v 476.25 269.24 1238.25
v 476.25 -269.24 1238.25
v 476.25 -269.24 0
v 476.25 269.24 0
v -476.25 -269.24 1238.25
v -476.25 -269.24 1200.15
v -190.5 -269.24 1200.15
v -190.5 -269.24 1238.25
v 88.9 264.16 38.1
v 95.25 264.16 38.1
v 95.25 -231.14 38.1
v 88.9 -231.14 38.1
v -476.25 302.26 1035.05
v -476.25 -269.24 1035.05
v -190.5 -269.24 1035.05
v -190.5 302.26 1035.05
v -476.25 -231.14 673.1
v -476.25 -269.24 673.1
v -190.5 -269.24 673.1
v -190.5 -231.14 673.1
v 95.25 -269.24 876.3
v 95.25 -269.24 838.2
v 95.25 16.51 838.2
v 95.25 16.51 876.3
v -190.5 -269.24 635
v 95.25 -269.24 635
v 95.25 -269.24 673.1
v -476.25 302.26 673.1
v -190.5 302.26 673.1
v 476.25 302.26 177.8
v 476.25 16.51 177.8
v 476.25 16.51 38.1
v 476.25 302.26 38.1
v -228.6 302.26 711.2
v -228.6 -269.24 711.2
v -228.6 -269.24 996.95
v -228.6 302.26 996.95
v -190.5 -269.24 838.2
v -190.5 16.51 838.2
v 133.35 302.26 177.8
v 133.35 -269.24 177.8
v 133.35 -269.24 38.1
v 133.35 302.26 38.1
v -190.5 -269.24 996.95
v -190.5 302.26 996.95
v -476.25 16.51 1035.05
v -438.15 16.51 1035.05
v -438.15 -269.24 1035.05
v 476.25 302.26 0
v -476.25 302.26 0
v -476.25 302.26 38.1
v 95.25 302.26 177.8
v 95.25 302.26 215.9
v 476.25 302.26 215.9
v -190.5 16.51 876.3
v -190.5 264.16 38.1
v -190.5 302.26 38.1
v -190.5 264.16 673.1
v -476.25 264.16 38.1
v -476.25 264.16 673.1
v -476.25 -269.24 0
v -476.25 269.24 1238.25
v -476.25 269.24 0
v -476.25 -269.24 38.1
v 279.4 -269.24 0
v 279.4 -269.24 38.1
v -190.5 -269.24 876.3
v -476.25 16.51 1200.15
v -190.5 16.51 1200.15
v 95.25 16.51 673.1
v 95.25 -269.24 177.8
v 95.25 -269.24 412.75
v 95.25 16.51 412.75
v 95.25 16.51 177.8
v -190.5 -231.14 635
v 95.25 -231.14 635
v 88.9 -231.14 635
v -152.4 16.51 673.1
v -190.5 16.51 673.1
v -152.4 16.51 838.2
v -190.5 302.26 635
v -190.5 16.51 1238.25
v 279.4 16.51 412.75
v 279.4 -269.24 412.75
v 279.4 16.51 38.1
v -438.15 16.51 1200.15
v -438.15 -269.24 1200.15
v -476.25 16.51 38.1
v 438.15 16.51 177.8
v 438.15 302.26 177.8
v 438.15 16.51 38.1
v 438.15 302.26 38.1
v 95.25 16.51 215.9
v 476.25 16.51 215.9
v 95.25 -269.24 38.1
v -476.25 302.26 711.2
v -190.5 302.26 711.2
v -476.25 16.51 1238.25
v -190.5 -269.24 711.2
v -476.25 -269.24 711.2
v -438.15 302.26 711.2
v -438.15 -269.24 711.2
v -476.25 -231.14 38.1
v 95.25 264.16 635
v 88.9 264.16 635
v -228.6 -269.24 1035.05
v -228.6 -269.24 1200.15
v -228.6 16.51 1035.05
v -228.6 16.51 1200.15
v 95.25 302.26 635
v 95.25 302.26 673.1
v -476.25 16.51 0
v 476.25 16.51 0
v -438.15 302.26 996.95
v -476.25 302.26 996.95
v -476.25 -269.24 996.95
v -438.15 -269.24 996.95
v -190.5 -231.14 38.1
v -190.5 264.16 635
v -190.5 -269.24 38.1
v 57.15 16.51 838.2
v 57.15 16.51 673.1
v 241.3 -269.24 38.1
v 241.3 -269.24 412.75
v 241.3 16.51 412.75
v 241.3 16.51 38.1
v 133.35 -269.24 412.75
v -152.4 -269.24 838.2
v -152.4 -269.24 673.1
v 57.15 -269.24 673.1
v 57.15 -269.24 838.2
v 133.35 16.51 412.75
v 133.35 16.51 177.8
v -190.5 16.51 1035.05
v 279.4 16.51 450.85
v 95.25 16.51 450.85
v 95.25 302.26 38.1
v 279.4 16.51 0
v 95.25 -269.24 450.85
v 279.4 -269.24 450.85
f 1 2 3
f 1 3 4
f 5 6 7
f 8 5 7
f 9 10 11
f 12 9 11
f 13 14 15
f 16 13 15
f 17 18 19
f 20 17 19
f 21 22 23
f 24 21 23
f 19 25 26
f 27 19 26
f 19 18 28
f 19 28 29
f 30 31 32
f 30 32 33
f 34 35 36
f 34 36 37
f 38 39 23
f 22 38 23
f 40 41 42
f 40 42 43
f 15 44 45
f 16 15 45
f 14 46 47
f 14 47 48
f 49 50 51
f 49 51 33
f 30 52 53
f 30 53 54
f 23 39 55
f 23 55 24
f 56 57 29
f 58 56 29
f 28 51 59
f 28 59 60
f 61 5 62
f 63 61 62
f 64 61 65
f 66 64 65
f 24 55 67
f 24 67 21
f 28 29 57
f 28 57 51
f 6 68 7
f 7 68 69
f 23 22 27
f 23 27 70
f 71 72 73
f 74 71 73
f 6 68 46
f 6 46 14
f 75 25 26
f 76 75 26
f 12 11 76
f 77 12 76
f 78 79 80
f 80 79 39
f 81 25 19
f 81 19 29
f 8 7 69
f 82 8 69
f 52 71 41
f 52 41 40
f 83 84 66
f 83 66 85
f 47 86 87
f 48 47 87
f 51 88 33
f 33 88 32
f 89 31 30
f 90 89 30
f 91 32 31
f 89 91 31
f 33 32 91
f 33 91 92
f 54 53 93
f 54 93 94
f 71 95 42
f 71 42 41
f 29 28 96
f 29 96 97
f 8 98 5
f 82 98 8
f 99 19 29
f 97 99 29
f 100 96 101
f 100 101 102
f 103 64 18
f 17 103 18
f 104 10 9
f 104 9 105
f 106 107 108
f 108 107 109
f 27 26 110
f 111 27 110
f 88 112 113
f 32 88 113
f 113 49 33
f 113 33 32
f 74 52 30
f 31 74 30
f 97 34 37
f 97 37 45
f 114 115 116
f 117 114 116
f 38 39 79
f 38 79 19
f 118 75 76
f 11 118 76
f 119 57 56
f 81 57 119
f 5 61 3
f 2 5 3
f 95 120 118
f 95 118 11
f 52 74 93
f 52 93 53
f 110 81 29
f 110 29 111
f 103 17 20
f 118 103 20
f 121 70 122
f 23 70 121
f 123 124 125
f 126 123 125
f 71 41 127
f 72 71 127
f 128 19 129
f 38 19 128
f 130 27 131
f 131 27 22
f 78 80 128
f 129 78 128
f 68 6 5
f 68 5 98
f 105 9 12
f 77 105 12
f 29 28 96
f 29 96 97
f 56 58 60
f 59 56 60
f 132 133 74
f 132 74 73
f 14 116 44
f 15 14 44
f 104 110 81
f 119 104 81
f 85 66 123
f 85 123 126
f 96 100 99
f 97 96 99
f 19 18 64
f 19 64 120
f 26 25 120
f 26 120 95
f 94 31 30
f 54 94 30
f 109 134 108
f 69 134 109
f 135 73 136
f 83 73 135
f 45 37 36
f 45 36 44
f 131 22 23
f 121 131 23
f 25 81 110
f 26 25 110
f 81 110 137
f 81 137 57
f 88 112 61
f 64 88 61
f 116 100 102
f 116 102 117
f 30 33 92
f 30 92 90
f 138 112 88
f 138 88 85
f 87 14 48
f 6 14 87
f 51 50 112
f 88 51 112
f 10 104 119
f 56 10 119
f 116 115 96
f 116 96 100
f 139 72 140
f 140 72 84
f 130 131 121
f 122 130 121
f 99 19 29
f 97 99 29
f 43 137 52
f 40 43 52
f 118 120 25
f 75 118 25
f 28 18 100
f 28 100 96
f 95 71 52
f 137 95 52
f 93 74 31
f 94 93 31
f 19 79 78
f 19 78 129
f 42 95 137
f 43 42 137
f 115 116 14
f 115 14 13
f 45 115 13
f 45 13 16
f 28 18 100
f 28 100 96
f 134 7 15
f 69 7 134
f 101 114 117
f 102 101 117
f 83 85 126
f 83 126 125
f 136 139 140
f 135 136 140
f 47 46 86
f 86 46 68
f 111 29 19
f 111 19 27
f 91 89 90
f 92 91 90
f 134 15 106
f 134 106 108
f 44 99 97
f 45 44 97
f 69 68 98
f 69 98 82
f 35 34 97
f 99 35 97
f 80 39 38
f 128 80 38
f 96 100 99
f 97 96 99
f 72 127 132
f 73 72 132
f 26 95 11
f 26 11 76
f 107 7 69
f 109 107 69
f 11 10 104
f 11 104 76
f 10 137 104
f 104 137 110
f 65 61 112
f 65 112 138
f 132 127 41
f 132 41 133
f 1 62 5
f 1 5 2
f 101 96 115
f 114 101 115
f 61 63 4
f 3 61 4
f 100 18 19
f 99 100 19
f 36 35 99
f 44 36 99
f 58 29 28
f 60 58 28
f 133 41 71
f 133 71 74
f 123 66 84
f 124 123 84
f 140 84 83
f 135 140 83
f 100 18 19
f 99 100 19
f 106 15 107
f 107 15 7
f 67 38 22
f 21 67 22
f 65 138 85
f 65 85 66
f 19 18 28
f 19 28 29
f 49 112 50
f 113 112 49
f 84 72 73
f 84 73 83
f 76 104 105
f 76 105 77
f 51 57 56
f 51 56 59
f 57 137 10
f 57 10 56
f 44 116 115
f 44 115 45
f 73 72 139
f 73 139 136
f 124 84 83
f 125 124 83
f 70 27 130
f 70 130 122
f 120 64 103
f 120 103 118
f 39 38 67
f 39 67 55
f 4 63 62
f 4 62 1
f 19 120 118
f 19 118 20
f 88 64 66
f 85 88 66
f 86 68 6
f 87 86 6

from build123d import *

# Parameters (mm, degrees)
F0_W      = 952.5
F0_H      = 538.48
F1_DEPTH  = 1238.25
F2_W      = 755.65
F2_H      = 285.75
F3_DEPTH  = 38.1
F4_W      = 952.5
F4_H      = 285.75
F5_DEPTH  = 38.1
F6_W      = 285.75
F6_H      = 635
F7_DEPTH  = 38.1
F8_W      = 285.75
F8_H      = 596.9
F9_DEPTH  = 38.1
F10_W     = 285.75
F10_H     = 635
F11_DEPTH = 38.1
F12_W     = 285.75
F12_H     = 596.9
F13_DEPTH = 38.1
F14_W     = 571.5
F14_H     = 139.7
F15_DEPTH = 38.1
F16_W     = 285.75
F16_H     = 374.65
F17_DEPTH = 38.1
F18_W     = 285.75
F18_H     = 139.7
F19_DEPTH = 38.1
F20_W     = 381
F20_H     = 285.75
F21_DEPTH = 38.1
F22_W     = 285.75
F22_H     = 234.95
F23_DEPTH = 38.1
F24_W     = 184.15
F24_H     = 285.75
F25_DEPTH = 38.1
F26_W     = 285.75
F26_H     = 571.5
F27_DEPTH = 38.1
F28_W     = 285.75
F28_H     = 571.5
F29_DEPTH = 38.1
F30_W     = 285.75
F30_H     = 165.1
F31_DEPTH = 38.1
F32_W     = 285.75
F32_H     = 165.1
F33_DEPTH = 38.1
F34_W     = 285.75
F34_H     = 285.75
F35_DEPTH = 38.1
F36_W     = 285.75
F36_H     = 571.5
F37_DEPTH = 38.1
F38_W     = 38.1
F38_H     = 571.5
F39_DEPTH = 285.75
F40_W     = 571.5
F40_H     = 285.75
F41_DEPTH = 38.1
F42_W     = 285.75
F42_H     = 571.5
F43_DEPTH = 38.1
F44_W     = 285.75
F44_H     = 165.1
F45_DEPTH = 38.1
F46_W     = 285.75
F46_H     = 165.1
F47_DEPTH = 38.1
F48_W     = 285.75
F48_H     = 285.75
F49_DEPTH = 38.1
F50_W     = 495.3
F50_H     = 596.9
F51_DEPTH = 6.35


with BuildPart() as f1:
    # F0 (on Top) → F1 (new body)
    with BuildSketch(Plane.XY):
        Rectangle(F0_W, F0_H)
    extrude(amount=F1_DEPTH)


with BuildPart() as f3:
    # F2 (on face) → F3 (new body)
    with BuildSketch(Plane(origin=(0, 0, 0), x_dir=(1, 0, 0), z_dir=(0, 0, -1))):
        with Locations((-98.425, 126.365)):
            Rectangle(F2_W, F2_H)
    extrude(amount=-F3_DEPTH)


with BuildPart() as f5:
    # F4 (on face) → F5 (new body)
    with BuildSketch(Plane(origin=(0, 0, 0), x_dir=(1, 0, 0), z_dir=(0, 0, -1))):
        with Locations((0, -159.385)):
            Rectangle(F4_W, F4_H)
    extrude(amount=-F5_DEPTH)


with BuildPart() as f7:
    # F6 (on face) → F7 (new body)
    with BuildSketch(Plane(origin=(0, 302.26, 0), x_dir=(-1, 0, 0), z_dir=(0, 1, 0))):
        with Locations((333.375, 355.6)):
            Rectangle(F6_W, F6_H)
    extrude(amount=-F7_DEPTH)


with BuildPart() as f9:
    # F8 (on face) → F9 (new body)
    with BuildSketch(Plane(origin=(0, 302.26, 0), x_dir=(-1, 0, 0), z_dir=(0, 1, 0))):
        with Locations((47.625, 336.55)):
            Rectangle(F8_W, F8_H)
    extrude(amount=-F9_DEPTH)


with BuildPart() as f11:
    # F10 (on face) → F11 (new body)
    with BuildSketch(Plane.XZ.offset(269.24)):
        with Locations((-333.375, 355.6)):
            Rectangle(F10_W, F10_H)
    extrude(amount=-F11_DEPTH)


with BuildPart() as f13:
    # F12 (on face) → F13 (new body)
    with BuildSketch(Plane.XZ.offset(269.24)):
        with Locations((-47.625, 336.55)):
            Rectangle(F12_W, F12_H)
    extrude(amount=-F13_DEPTH)


with BuildPart() as f15:
    # F14 (on face) → F15 (new body)
    with BuildSketch(Plane.YZ.offset(95.25)):
        with Locations((16.51, 107.95)):
            Rectangle(F14_W, F14_H)
    extrude(amount=F15_DEPTH)


with BuildPart() as f17:
    # F16 (on face) → F17 (new body)
    with BuildSketch(Plane.YZ.offset(279.4)):
        with Locations((-126.365, 225.425)):
            Rectangle(F16_W, F16_H)
    extrude(amount=-F17_DEPTH)


with BuildPart() as f19:
    # F18 (on face) → F19 (new body)
    with BuildSketch(Plane.YZ.offset(476.25)):
        with Locations((159.385, 107.95)):
            Rectangle(F18_W, F18_H)
    extrude(amount=-F19_DEPTH)


with BuildPart() as f21:
    # F20 (on face) → F21 (new body)
    with BuildSketch(Plane.XY.offset(177.8)):
        with Locations((285.75, 159.385)):
            Rectangle(F20_W, F20_H)
    extrude(amount=F21_DEPTH)


with BuildPart() as f23:
    # F22 (on face) → F23 (new body)
    with BuildSketch(Plane.YZ.offset(133.35)):
        with Locations((-126.365, 295.275)):
            Rectangle(F22_W, F22_H)
    extrude(amount=-F23_DEPTH)


with BuildPart() as f25:
    # F24 (on face) → F25 (new body)
    with BuildSketch(Plane.XY.offset(412.75)):
        with Locations((187.325, -126.365)):
            Rectangle(F24_W, F24_H)
    extrude(amount=F25_DEPTH)


with BuildPart() as f27:
    # F26 (on face) → F27 (new body)
    with BuildSketch(Plane.XY.offset(635)):
        with Locations((-47.625, 16.51)):
            Rectangle(F26_W, F26_H)
    extrude(amount=F27_DEPTH)


with BuildPart() as f29:
    # F28 (on face) → F29 (new body)
    with BuildSketch(Plane.XY.offset(996.95)):
        with Locations((-333.375, 16.51)):
            Rectangle(F28_W, F28_H)
    extrude(amount=F29_DEPTH)


with BuildPart() as f31:
    # F30 (on face) → F31 (new body)
    with BuildSketch(Plane.YZ.offset(95.25)):
        with Locations((-126.365, 755.65)):
            Rectangle(F30_W, F30_H)
    extrude(amount=-F31_DEPTH)


with BuildPart() as f33:
    # F32 (on face) → F33 (new body)
    with BuildSketch(Plane(origin=(-190.5, 0, 0), x_dir=(0, -1, 0), z_dir=(-1, 0, 0))):
        with Locations((126.365, 755.65)):
            Rectangle(F32_W, F32_H)
    extrude(amount=-F33_DEPTH)


with BuildPart() as f35:
    # F34 (on face) → F35 (new body)
    with BuildSketch(Plane.XY.offset(838.2)):
        with Locations((-47.625, -126.365)):
            Rectangle(F34_W, F34_H)
    extrude(amount=F35_DEPTH)


with BuildPart() as f37:
    # F36 (on face) → F37 (new body)
    with BuildSketch(Plane.XY.offset(673.1)):
        with Locations((-333.375, 16.51)):
            Rectangle(F36_W, F36_H)
    extrude(amount=F37_DEPTH)


with BuildPart() as f39:
    # F38 (on face) → F39 (new body)
    with BuildSketch(Plane.XY.offset(711.2)):
        with Locations((-209.55, 16.51)):
            Rectangle(F38_W, F38_H)
    extrude(amount=F39_DEPTH)


with BuildPart() as f41:
    # F40 (on face) → F41 (new body)
    with BuildSketch(Plane(origin=(-476.25, 0, 0), x_dir=(0, -1, 0), z_dir=(-1, 0, 0))):
        with Locations((-16.51, 854.075)):
            Rectangle(F40_W, F40_H)
    extrude(amount=-F41_DEPTH)


with BuildPart() as f43:
    # F42 (on face) → F43 (new body)
    with BuildSketch(Plane.XY.offset(673.1)):
        with Locations((-333.375, 16.51)):
            Rectangle(F42_W, F42_H)
    extrude(amount=F43_DEPTH)


with BuildPart() as f45:
    # F44 (on face) → F45 (new body)
    with BuildSketch(Plane.YZ.offset(-190.5)):
        with Locations((-126.365, 1117.6)):
            Rectangle(F44_W, F44_H)
    extrude(amount=-F45_DEPTH)


with BuildPart() as f47:
    # F46 (on face) → F47 (new body)
    with BuildSketch(Plane(origin=(-476.25, 0, 0), x_dir=(0, -1, 0), z_dir=(-1, 0, 0))):
        with Locations((126.365, 1117.6)):
            Rectangle(F46_W, F46_H)
    extrude(amount=-F47_DEPTH)


with BuildPart() as f49:
    # F48 (on face) → F49 (new body)
    with BuildSketch(Plane.XY.offset(1200.15)):
        with Locations((-333.375, -126.365)):
            Rectangle(F48_W, F48_H)
    extrude(amount=F49_DEPTH)


with BuildPart() as f51:
    # F50 (on face) → F51 (new body)
    with BuildSketch(Plane(origin=(95.25, 0, 0), x_dir=(0, -1, 0), z_dir=(-1, 0, 0))):
        with Locations((-16.51, 336.55)):
            Rectangle(F50_W, F50_H)
    extrude(amount=F51_DEPTH)


solid = Compound([f1.part, f3.part, f5.part, f7.part, f9.part, f11.part, f13.part, f15.part, f17.part, f19.part, f21.part, f23.part, f25.part, f27.part, f29.part, f31.part, f33.part, f35.part, f37.part, f39.part, f41.part, f43.part, f45.part, f47.part, f49.part, f51.part])
